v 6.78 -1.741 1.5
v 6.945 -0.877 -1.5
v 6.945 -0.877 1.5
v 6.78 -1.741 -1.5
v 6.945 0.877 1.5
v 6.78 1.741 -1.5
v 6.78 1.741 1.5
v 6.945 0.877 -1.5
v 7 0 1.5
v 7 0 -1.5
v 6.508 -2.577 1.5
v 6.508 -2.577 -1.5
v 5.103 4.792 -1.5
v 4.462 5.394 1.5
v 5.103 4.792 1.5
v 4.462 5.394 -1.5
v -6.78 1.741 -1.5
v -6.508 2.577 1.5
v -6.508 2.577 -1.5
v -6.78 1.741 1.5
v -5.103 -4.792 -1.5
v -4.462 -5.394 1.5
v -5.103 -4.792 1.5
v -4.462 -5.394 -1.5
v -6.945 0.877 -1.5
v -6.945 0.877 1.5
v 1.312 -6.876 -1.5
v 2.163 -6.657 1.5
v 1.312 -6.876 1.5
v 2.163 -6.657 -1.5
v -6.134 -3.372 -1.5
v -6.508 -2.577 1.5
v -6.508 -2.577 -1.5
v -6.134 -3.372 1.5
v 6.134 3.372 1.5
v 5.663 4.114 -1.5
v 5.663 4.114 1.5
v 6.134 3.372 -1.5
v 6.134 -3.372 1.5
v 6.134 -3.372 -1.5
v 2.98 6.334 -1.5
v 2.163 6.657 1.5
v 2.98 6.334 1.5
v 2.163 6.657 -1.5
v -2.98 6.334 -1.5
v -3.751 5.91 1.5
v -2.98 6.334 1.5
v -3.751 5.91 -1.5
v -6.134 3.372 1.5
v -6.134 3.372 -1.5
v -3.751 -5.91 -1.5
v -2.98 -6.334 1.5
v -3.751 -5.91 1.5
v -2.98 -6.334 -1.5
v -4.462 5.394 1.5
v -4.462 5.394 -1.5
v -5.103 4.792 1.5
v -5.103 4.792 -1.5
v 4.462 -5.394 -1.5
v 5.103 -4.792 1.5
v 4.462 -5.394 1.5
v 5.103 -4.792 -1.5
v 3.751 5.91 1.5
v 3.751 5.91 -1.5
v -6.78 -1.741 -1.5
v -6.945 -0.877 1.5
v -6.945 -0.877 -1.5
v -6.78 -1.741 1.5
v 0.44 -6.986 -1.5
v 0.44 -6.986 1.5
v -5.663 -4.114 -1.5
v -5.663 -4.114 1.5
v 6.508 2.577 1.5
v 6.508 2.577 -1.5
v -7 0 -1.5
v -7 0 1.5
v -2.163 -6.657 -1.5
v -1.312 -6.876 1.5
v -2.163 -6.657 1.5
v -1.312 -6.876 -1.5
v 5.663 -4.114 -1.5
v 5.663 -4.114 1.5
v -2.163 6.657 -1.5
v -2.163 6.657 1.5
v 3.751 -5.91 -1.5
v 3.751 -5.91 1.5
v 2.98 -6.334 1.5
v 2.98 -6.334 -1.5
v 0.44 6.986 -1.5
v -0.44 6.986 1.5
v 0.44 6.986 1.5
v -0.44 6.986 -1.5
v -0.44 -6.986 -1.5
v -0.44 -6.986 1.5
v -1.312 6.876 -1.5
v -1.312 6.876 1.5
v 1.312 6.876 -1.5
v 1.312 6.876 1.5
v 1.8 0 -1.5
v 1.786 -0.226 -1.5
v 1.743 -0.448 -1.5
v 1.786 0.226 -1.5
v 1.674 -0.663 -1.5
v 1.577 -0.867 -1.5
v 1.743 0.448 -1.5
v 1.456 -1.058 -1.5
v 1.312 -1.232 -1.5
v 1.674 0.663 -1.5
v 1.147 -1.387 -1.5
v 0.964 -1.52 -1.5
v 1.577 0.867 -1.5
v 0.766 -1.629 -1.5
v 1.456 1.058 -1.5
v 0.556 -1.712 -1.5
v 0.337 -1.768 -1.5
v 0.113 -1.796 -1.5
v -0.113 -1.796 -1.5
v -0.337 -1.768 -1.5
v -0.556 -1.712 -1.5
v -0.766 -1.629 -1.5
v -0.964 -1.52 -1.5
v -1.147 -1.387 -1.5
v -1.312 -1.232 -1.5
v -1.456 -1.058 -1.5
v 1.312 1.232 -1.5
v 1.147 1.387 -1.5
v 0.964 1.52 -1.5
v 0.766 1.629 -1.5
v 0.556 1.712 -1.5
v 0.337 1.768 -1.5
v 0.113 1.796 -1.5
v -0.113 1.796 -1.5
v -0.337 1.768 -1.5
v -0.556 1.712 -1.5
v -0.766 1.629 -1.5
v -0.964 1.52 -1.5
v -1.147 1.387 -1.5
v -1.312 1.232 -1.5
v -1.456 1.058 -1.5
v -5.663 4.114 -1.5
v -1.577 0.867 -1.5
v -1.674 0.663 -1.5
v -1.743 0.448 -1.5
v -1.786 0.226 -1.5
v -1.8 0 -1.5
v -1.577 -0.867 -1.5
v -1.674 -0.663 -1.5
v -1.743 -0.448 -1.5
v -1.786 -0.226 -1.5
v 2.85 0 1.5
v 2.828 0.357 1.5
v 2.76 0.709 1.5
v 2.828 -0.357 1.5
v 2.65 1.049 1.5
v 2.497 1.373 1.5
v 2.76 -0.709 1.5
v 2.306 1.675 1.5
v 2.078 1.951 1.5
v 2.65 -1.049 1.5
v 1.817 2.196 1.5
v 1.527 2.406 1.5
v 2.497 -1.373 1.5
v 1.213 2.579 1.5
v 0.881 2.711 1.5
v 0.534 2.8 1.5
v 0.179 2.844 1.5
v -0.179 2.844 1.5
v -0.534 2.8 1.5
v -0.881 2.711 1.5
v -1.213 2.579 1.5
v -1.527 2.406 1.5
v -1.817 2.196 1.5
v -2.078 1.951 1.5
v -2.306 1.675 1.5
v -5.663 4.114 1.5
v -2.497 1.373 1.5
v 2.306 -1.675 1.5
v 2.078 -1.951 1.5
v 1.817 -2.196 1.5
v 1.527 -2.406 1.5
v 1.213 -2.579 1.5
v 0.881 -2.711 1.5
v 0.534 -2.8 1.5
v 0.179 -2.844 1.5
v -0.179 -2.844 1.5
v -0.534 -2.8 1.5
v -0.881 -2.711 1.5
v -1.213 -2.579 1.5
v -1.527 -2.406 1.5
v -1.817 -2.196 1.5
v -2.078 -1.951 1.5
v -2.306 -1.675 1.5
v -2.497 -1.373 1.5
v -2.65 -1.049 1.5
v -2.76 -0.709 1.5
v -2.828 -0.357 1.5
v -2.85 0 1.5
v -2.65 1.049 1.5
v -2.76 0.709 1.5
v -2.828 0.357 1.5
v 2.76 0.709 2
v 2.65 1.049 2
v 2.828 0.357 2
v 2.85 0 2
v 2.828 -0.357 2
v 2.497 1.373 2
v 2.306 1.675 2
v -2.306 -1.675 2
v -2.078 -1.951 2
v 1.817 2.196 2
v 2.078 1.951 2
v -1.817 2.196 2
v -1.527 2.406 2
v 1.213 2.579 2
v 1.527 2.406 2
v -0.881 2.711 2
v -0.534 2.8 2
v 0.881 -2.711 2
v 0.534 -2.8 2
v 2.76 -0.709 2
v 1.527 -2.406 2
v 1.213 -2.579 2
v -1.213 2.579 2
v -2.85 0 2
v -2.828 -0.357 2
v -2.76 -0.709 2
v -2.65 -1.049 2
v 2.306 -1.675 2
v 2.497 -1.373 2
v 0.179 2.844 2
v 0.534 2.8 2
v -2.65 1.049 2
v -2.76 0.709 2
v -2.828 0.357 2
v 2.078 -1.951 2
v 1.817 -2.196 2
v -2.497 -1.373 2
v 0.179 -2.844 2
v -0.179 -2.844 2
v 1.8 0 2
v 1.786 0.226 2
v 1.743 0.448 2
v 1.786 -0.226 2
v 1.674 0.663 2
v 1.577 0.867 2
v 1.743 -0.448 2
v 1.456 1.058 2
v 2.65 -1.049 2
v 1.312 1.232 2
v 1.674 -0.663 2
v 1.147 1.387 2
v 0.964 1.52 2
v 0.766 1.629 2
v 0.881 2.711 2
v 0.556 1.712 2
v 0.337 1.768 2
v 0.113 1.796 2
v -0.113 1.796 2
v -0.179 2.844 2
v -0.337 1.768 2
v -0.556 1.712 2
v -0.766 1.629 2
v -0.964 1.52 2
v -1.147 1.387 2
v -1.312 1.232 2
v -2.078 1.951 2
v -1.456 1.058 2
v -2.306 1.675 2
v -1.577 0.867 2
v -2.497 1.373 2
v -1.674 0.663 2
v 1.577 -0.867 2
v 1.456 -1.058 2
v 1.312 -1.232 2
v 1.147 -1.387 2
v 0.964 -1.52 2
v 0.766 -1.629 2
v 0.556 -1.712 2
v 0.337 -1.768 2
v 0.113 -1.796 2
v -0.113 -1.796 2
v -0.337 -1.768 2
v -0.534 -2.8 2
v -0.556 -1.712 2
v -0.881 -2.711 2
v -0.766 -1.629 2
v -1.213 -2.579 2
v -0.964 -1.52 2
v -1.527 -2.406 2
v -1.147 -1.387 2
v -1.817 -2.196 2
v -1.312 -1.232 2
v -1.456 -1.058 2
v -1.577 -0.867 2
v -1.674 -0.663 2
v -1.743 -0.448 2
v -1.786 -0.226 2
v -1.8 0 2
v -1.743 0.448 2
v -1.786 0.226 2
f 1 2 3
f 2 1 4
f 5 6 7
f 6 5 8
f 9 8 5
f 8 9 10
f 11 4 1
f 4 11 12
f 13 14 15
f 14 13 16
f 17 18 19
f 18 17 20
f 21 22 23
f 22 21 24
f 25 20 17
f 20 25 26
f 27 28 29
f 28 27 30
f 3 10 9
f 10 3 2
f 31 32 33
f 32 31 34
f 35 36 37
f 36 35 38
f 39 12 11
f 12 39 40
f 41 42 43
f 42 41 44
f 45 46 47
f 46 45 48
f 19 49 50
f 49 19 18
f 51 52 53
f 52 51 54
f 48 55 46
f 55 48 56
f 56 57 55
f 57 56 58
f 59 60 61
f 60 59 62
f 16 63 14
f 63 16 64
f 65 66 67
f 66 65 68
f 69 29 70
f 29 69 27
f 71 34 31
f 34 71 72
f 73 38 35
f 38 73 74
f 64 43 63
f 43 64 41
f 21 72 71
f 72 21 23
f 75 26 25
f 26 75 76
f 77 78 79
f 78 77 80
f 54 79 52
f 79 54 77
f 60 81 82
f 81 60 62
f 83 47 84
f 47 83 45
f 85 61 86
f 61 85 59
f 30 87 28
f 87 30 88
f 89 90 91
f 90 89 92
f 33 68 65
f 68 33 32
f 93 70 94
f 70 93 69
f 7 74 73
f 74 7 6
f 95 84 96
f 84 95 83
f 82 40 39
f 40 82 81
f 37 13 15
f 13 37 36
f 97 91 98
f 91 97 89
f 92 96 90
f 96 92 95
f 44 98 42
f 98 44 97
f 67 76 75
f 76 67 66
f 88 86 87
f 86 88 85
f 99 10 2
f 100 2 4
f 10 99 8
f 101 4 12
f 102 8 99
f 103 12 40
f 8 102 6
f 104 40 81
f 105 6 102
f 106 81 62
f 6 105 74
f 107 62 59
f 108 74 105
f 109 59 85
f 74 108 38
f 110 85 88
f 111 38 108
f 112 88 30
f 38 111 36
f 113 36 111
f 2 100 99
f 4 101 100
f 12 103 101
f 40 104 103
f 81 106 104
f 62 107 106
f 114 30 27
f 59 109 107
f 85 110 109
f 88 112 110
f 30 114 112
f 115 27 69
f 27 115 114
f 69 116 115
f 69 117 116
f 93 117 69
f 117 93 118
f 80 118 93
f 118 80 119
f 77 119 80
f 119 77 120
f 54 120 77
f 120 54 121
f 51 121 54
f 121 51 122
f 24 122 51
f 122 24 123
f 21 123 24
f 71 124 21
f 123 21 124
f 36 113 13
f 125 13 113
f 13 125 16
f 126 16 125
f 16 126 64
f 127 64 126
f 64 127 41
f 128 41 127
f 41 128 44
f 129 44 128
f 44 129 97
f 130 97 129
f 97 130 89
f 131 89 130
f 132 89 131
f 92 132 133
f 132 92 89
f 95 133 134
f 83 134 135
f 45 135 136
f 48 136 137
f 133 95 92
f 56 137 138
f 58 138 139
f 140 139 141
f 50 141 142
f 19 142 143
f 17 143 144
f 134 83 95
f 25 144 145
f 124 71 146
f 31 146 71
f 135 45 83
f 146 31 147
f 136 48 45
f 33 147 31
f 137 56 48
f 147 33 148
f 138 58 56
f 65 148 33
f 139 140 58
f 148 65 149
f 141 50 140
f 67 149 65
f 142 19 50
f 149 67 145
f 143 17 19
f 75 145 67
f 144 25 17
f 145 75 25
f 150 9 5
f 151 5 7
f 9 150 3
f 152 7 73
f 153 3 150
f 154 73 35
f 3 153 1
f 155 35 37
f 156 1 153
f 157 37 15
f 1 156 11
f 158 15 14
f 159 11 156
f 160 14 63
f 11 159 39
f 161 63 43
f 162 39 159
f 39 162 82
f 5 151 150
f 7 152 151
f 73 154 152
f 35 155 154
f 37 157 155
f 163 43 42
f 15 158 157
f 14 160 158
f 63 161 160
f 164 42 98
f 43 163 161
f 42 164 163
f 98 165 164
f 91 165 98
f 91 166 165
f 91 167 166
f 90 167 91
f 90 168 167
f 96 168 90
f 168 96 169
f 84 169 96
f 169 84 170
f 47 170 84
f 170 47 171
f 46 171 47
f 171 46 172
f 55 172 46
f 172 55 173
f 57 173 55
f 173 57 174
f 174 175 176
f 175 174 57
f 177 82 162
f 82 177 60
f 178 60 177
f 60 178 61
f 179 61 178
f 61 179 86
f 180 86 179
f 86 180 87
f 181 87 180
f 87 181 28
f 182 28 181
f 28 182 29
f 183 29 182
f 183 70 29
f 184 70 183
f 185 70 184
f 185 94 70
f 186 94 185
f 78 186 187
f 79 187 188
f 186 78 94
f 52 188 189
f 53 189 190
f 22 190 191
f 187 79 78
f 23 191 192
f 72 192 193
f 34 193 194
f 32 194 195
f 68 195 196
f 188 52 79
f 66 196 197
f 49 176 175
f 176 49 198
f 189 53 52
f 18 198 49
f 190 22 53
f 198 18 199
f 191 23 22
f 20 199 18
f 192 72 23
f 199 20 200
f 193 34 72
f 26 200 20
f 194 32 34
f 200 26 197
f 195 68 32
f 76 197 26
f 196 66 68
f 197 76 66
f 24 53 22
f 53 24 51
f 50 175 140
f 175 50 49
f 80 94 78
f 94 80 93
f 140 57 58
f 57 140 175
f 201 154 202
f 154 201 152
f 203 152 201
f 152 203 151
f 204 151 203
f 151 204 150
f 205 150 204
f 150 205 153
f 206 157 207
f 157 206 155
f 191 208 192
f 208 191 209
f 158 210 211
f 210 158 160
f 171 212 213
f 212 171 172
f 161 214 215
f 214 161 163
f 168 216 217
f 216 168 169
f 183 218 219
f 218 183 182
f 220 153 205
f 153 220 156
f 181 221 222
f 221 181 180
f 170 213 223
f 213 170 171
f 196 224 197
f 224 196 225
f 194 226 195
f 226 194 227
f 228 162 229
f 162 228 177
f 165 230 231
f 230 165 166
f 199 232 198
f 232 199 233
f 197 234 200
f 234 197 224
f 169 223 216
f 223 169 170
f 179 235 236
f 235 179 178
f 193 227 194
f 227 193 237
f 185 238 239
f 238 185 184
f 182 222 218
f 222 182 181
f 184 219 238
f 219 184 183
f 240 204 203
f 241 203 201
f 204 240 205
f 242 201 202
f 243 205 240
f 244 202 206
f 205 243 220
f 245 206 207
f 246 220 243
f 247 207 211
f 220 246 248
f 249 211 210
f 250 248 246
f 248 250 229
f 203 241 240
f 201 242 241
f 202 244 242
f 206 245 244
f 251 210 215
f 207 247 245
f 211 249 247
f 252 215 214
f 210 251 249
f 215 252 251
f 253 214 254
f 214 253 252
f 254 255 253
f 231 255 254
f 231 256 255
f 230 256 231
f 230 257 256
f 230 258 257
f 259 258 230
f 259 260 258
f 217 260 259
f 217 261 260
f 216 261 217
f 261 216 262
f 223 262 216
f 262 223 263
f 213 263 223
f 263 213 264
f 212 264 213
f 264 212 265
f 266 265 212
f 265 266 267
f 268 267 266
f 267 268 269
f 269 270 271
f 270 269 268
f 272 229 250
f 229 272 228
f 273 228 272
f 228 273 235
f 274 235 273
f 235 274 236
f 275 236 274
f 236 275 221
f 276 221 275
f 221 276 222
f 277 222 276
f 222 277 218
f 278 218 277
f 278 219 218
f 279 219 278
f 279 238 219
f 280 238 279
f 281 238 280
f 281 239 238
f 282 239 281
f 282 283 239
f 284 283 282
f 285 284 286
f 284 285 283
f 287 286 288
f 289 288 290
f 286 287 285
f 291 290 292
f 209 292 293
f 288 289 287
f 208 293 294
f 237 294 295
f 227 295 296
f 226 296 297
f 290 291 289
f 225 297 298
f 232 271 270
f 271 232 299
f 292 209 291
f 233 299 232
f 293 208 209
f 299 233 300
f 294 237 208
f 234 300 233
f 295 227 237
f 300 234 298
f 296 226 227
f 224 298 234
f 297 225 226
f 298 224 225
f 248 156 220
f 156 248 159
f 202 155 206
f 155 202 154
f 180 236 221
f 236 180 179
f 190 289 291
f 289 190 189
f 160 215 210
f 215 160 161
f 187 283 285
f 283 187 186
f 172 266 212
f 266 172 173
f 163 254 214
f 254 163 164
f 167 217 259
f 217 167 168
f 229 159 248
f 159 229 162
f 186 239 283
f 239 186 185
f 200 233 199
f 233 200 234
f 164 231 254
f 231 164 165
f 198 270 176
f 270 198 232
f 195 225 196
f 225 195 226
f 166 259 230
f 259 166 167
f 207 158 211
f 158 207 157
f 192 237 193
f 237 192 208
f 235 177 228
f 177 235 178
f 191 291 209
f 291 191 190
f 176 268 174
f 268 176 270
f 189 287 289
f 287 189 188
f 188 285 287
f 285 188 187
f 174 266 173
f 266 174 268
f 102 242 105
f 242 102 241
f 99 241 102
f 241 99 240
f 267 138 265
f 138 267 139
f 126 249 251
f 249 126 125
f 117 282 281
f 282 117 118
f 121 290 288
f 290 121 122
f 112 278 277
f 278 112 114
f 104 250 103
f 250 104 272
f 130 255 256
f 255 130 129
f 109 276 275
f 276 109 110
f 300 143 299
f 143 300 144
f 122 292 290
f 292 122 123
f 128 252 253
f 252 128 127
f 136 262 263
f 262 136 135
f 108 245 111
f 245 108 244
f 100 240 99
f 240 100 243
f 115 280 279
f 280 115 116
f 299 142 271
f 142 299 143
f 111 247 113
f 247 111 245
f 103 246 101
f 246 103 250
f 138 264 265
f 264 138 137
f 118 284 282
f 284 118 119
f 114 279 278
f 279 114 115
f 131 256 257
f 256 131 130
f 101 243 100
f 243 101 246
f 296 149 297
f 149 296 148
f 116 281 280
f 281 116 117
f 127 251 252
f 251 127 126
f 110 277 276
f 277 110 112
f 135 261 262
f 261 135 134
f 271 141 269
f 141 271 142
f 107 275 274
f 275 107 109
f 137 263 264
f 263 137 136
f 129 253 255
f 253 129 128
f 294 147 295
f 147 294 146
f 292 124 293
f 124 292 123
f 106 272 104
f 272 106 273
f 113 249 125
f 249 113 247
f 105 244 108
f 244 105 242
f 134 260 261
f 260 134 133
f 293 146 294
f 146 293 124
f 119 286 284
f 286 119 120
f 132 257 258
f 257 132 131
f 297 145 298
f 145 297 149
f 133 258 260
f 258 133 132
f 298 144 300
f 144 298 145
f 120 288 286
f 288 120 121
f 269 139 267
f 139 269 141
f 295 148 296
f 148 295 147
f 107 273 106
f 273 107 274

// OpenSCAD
$fn = 50;


difference() {
	union() {
		translate(v = [0, 0, -1.5000000000]) {
			cylinder(h = 3, r = 7.0000000000);
		}
		translate(v = [0, 0, -1.5000000000]) {
			cylinder(h = 3.5000000000, r = 2.8500000000);
		}
	}
	union() {
		translate(v = [0, 0, -100.0000000000]) {
			cylinder(h = 200, r = 1.8000000000);
		}
	}
}
